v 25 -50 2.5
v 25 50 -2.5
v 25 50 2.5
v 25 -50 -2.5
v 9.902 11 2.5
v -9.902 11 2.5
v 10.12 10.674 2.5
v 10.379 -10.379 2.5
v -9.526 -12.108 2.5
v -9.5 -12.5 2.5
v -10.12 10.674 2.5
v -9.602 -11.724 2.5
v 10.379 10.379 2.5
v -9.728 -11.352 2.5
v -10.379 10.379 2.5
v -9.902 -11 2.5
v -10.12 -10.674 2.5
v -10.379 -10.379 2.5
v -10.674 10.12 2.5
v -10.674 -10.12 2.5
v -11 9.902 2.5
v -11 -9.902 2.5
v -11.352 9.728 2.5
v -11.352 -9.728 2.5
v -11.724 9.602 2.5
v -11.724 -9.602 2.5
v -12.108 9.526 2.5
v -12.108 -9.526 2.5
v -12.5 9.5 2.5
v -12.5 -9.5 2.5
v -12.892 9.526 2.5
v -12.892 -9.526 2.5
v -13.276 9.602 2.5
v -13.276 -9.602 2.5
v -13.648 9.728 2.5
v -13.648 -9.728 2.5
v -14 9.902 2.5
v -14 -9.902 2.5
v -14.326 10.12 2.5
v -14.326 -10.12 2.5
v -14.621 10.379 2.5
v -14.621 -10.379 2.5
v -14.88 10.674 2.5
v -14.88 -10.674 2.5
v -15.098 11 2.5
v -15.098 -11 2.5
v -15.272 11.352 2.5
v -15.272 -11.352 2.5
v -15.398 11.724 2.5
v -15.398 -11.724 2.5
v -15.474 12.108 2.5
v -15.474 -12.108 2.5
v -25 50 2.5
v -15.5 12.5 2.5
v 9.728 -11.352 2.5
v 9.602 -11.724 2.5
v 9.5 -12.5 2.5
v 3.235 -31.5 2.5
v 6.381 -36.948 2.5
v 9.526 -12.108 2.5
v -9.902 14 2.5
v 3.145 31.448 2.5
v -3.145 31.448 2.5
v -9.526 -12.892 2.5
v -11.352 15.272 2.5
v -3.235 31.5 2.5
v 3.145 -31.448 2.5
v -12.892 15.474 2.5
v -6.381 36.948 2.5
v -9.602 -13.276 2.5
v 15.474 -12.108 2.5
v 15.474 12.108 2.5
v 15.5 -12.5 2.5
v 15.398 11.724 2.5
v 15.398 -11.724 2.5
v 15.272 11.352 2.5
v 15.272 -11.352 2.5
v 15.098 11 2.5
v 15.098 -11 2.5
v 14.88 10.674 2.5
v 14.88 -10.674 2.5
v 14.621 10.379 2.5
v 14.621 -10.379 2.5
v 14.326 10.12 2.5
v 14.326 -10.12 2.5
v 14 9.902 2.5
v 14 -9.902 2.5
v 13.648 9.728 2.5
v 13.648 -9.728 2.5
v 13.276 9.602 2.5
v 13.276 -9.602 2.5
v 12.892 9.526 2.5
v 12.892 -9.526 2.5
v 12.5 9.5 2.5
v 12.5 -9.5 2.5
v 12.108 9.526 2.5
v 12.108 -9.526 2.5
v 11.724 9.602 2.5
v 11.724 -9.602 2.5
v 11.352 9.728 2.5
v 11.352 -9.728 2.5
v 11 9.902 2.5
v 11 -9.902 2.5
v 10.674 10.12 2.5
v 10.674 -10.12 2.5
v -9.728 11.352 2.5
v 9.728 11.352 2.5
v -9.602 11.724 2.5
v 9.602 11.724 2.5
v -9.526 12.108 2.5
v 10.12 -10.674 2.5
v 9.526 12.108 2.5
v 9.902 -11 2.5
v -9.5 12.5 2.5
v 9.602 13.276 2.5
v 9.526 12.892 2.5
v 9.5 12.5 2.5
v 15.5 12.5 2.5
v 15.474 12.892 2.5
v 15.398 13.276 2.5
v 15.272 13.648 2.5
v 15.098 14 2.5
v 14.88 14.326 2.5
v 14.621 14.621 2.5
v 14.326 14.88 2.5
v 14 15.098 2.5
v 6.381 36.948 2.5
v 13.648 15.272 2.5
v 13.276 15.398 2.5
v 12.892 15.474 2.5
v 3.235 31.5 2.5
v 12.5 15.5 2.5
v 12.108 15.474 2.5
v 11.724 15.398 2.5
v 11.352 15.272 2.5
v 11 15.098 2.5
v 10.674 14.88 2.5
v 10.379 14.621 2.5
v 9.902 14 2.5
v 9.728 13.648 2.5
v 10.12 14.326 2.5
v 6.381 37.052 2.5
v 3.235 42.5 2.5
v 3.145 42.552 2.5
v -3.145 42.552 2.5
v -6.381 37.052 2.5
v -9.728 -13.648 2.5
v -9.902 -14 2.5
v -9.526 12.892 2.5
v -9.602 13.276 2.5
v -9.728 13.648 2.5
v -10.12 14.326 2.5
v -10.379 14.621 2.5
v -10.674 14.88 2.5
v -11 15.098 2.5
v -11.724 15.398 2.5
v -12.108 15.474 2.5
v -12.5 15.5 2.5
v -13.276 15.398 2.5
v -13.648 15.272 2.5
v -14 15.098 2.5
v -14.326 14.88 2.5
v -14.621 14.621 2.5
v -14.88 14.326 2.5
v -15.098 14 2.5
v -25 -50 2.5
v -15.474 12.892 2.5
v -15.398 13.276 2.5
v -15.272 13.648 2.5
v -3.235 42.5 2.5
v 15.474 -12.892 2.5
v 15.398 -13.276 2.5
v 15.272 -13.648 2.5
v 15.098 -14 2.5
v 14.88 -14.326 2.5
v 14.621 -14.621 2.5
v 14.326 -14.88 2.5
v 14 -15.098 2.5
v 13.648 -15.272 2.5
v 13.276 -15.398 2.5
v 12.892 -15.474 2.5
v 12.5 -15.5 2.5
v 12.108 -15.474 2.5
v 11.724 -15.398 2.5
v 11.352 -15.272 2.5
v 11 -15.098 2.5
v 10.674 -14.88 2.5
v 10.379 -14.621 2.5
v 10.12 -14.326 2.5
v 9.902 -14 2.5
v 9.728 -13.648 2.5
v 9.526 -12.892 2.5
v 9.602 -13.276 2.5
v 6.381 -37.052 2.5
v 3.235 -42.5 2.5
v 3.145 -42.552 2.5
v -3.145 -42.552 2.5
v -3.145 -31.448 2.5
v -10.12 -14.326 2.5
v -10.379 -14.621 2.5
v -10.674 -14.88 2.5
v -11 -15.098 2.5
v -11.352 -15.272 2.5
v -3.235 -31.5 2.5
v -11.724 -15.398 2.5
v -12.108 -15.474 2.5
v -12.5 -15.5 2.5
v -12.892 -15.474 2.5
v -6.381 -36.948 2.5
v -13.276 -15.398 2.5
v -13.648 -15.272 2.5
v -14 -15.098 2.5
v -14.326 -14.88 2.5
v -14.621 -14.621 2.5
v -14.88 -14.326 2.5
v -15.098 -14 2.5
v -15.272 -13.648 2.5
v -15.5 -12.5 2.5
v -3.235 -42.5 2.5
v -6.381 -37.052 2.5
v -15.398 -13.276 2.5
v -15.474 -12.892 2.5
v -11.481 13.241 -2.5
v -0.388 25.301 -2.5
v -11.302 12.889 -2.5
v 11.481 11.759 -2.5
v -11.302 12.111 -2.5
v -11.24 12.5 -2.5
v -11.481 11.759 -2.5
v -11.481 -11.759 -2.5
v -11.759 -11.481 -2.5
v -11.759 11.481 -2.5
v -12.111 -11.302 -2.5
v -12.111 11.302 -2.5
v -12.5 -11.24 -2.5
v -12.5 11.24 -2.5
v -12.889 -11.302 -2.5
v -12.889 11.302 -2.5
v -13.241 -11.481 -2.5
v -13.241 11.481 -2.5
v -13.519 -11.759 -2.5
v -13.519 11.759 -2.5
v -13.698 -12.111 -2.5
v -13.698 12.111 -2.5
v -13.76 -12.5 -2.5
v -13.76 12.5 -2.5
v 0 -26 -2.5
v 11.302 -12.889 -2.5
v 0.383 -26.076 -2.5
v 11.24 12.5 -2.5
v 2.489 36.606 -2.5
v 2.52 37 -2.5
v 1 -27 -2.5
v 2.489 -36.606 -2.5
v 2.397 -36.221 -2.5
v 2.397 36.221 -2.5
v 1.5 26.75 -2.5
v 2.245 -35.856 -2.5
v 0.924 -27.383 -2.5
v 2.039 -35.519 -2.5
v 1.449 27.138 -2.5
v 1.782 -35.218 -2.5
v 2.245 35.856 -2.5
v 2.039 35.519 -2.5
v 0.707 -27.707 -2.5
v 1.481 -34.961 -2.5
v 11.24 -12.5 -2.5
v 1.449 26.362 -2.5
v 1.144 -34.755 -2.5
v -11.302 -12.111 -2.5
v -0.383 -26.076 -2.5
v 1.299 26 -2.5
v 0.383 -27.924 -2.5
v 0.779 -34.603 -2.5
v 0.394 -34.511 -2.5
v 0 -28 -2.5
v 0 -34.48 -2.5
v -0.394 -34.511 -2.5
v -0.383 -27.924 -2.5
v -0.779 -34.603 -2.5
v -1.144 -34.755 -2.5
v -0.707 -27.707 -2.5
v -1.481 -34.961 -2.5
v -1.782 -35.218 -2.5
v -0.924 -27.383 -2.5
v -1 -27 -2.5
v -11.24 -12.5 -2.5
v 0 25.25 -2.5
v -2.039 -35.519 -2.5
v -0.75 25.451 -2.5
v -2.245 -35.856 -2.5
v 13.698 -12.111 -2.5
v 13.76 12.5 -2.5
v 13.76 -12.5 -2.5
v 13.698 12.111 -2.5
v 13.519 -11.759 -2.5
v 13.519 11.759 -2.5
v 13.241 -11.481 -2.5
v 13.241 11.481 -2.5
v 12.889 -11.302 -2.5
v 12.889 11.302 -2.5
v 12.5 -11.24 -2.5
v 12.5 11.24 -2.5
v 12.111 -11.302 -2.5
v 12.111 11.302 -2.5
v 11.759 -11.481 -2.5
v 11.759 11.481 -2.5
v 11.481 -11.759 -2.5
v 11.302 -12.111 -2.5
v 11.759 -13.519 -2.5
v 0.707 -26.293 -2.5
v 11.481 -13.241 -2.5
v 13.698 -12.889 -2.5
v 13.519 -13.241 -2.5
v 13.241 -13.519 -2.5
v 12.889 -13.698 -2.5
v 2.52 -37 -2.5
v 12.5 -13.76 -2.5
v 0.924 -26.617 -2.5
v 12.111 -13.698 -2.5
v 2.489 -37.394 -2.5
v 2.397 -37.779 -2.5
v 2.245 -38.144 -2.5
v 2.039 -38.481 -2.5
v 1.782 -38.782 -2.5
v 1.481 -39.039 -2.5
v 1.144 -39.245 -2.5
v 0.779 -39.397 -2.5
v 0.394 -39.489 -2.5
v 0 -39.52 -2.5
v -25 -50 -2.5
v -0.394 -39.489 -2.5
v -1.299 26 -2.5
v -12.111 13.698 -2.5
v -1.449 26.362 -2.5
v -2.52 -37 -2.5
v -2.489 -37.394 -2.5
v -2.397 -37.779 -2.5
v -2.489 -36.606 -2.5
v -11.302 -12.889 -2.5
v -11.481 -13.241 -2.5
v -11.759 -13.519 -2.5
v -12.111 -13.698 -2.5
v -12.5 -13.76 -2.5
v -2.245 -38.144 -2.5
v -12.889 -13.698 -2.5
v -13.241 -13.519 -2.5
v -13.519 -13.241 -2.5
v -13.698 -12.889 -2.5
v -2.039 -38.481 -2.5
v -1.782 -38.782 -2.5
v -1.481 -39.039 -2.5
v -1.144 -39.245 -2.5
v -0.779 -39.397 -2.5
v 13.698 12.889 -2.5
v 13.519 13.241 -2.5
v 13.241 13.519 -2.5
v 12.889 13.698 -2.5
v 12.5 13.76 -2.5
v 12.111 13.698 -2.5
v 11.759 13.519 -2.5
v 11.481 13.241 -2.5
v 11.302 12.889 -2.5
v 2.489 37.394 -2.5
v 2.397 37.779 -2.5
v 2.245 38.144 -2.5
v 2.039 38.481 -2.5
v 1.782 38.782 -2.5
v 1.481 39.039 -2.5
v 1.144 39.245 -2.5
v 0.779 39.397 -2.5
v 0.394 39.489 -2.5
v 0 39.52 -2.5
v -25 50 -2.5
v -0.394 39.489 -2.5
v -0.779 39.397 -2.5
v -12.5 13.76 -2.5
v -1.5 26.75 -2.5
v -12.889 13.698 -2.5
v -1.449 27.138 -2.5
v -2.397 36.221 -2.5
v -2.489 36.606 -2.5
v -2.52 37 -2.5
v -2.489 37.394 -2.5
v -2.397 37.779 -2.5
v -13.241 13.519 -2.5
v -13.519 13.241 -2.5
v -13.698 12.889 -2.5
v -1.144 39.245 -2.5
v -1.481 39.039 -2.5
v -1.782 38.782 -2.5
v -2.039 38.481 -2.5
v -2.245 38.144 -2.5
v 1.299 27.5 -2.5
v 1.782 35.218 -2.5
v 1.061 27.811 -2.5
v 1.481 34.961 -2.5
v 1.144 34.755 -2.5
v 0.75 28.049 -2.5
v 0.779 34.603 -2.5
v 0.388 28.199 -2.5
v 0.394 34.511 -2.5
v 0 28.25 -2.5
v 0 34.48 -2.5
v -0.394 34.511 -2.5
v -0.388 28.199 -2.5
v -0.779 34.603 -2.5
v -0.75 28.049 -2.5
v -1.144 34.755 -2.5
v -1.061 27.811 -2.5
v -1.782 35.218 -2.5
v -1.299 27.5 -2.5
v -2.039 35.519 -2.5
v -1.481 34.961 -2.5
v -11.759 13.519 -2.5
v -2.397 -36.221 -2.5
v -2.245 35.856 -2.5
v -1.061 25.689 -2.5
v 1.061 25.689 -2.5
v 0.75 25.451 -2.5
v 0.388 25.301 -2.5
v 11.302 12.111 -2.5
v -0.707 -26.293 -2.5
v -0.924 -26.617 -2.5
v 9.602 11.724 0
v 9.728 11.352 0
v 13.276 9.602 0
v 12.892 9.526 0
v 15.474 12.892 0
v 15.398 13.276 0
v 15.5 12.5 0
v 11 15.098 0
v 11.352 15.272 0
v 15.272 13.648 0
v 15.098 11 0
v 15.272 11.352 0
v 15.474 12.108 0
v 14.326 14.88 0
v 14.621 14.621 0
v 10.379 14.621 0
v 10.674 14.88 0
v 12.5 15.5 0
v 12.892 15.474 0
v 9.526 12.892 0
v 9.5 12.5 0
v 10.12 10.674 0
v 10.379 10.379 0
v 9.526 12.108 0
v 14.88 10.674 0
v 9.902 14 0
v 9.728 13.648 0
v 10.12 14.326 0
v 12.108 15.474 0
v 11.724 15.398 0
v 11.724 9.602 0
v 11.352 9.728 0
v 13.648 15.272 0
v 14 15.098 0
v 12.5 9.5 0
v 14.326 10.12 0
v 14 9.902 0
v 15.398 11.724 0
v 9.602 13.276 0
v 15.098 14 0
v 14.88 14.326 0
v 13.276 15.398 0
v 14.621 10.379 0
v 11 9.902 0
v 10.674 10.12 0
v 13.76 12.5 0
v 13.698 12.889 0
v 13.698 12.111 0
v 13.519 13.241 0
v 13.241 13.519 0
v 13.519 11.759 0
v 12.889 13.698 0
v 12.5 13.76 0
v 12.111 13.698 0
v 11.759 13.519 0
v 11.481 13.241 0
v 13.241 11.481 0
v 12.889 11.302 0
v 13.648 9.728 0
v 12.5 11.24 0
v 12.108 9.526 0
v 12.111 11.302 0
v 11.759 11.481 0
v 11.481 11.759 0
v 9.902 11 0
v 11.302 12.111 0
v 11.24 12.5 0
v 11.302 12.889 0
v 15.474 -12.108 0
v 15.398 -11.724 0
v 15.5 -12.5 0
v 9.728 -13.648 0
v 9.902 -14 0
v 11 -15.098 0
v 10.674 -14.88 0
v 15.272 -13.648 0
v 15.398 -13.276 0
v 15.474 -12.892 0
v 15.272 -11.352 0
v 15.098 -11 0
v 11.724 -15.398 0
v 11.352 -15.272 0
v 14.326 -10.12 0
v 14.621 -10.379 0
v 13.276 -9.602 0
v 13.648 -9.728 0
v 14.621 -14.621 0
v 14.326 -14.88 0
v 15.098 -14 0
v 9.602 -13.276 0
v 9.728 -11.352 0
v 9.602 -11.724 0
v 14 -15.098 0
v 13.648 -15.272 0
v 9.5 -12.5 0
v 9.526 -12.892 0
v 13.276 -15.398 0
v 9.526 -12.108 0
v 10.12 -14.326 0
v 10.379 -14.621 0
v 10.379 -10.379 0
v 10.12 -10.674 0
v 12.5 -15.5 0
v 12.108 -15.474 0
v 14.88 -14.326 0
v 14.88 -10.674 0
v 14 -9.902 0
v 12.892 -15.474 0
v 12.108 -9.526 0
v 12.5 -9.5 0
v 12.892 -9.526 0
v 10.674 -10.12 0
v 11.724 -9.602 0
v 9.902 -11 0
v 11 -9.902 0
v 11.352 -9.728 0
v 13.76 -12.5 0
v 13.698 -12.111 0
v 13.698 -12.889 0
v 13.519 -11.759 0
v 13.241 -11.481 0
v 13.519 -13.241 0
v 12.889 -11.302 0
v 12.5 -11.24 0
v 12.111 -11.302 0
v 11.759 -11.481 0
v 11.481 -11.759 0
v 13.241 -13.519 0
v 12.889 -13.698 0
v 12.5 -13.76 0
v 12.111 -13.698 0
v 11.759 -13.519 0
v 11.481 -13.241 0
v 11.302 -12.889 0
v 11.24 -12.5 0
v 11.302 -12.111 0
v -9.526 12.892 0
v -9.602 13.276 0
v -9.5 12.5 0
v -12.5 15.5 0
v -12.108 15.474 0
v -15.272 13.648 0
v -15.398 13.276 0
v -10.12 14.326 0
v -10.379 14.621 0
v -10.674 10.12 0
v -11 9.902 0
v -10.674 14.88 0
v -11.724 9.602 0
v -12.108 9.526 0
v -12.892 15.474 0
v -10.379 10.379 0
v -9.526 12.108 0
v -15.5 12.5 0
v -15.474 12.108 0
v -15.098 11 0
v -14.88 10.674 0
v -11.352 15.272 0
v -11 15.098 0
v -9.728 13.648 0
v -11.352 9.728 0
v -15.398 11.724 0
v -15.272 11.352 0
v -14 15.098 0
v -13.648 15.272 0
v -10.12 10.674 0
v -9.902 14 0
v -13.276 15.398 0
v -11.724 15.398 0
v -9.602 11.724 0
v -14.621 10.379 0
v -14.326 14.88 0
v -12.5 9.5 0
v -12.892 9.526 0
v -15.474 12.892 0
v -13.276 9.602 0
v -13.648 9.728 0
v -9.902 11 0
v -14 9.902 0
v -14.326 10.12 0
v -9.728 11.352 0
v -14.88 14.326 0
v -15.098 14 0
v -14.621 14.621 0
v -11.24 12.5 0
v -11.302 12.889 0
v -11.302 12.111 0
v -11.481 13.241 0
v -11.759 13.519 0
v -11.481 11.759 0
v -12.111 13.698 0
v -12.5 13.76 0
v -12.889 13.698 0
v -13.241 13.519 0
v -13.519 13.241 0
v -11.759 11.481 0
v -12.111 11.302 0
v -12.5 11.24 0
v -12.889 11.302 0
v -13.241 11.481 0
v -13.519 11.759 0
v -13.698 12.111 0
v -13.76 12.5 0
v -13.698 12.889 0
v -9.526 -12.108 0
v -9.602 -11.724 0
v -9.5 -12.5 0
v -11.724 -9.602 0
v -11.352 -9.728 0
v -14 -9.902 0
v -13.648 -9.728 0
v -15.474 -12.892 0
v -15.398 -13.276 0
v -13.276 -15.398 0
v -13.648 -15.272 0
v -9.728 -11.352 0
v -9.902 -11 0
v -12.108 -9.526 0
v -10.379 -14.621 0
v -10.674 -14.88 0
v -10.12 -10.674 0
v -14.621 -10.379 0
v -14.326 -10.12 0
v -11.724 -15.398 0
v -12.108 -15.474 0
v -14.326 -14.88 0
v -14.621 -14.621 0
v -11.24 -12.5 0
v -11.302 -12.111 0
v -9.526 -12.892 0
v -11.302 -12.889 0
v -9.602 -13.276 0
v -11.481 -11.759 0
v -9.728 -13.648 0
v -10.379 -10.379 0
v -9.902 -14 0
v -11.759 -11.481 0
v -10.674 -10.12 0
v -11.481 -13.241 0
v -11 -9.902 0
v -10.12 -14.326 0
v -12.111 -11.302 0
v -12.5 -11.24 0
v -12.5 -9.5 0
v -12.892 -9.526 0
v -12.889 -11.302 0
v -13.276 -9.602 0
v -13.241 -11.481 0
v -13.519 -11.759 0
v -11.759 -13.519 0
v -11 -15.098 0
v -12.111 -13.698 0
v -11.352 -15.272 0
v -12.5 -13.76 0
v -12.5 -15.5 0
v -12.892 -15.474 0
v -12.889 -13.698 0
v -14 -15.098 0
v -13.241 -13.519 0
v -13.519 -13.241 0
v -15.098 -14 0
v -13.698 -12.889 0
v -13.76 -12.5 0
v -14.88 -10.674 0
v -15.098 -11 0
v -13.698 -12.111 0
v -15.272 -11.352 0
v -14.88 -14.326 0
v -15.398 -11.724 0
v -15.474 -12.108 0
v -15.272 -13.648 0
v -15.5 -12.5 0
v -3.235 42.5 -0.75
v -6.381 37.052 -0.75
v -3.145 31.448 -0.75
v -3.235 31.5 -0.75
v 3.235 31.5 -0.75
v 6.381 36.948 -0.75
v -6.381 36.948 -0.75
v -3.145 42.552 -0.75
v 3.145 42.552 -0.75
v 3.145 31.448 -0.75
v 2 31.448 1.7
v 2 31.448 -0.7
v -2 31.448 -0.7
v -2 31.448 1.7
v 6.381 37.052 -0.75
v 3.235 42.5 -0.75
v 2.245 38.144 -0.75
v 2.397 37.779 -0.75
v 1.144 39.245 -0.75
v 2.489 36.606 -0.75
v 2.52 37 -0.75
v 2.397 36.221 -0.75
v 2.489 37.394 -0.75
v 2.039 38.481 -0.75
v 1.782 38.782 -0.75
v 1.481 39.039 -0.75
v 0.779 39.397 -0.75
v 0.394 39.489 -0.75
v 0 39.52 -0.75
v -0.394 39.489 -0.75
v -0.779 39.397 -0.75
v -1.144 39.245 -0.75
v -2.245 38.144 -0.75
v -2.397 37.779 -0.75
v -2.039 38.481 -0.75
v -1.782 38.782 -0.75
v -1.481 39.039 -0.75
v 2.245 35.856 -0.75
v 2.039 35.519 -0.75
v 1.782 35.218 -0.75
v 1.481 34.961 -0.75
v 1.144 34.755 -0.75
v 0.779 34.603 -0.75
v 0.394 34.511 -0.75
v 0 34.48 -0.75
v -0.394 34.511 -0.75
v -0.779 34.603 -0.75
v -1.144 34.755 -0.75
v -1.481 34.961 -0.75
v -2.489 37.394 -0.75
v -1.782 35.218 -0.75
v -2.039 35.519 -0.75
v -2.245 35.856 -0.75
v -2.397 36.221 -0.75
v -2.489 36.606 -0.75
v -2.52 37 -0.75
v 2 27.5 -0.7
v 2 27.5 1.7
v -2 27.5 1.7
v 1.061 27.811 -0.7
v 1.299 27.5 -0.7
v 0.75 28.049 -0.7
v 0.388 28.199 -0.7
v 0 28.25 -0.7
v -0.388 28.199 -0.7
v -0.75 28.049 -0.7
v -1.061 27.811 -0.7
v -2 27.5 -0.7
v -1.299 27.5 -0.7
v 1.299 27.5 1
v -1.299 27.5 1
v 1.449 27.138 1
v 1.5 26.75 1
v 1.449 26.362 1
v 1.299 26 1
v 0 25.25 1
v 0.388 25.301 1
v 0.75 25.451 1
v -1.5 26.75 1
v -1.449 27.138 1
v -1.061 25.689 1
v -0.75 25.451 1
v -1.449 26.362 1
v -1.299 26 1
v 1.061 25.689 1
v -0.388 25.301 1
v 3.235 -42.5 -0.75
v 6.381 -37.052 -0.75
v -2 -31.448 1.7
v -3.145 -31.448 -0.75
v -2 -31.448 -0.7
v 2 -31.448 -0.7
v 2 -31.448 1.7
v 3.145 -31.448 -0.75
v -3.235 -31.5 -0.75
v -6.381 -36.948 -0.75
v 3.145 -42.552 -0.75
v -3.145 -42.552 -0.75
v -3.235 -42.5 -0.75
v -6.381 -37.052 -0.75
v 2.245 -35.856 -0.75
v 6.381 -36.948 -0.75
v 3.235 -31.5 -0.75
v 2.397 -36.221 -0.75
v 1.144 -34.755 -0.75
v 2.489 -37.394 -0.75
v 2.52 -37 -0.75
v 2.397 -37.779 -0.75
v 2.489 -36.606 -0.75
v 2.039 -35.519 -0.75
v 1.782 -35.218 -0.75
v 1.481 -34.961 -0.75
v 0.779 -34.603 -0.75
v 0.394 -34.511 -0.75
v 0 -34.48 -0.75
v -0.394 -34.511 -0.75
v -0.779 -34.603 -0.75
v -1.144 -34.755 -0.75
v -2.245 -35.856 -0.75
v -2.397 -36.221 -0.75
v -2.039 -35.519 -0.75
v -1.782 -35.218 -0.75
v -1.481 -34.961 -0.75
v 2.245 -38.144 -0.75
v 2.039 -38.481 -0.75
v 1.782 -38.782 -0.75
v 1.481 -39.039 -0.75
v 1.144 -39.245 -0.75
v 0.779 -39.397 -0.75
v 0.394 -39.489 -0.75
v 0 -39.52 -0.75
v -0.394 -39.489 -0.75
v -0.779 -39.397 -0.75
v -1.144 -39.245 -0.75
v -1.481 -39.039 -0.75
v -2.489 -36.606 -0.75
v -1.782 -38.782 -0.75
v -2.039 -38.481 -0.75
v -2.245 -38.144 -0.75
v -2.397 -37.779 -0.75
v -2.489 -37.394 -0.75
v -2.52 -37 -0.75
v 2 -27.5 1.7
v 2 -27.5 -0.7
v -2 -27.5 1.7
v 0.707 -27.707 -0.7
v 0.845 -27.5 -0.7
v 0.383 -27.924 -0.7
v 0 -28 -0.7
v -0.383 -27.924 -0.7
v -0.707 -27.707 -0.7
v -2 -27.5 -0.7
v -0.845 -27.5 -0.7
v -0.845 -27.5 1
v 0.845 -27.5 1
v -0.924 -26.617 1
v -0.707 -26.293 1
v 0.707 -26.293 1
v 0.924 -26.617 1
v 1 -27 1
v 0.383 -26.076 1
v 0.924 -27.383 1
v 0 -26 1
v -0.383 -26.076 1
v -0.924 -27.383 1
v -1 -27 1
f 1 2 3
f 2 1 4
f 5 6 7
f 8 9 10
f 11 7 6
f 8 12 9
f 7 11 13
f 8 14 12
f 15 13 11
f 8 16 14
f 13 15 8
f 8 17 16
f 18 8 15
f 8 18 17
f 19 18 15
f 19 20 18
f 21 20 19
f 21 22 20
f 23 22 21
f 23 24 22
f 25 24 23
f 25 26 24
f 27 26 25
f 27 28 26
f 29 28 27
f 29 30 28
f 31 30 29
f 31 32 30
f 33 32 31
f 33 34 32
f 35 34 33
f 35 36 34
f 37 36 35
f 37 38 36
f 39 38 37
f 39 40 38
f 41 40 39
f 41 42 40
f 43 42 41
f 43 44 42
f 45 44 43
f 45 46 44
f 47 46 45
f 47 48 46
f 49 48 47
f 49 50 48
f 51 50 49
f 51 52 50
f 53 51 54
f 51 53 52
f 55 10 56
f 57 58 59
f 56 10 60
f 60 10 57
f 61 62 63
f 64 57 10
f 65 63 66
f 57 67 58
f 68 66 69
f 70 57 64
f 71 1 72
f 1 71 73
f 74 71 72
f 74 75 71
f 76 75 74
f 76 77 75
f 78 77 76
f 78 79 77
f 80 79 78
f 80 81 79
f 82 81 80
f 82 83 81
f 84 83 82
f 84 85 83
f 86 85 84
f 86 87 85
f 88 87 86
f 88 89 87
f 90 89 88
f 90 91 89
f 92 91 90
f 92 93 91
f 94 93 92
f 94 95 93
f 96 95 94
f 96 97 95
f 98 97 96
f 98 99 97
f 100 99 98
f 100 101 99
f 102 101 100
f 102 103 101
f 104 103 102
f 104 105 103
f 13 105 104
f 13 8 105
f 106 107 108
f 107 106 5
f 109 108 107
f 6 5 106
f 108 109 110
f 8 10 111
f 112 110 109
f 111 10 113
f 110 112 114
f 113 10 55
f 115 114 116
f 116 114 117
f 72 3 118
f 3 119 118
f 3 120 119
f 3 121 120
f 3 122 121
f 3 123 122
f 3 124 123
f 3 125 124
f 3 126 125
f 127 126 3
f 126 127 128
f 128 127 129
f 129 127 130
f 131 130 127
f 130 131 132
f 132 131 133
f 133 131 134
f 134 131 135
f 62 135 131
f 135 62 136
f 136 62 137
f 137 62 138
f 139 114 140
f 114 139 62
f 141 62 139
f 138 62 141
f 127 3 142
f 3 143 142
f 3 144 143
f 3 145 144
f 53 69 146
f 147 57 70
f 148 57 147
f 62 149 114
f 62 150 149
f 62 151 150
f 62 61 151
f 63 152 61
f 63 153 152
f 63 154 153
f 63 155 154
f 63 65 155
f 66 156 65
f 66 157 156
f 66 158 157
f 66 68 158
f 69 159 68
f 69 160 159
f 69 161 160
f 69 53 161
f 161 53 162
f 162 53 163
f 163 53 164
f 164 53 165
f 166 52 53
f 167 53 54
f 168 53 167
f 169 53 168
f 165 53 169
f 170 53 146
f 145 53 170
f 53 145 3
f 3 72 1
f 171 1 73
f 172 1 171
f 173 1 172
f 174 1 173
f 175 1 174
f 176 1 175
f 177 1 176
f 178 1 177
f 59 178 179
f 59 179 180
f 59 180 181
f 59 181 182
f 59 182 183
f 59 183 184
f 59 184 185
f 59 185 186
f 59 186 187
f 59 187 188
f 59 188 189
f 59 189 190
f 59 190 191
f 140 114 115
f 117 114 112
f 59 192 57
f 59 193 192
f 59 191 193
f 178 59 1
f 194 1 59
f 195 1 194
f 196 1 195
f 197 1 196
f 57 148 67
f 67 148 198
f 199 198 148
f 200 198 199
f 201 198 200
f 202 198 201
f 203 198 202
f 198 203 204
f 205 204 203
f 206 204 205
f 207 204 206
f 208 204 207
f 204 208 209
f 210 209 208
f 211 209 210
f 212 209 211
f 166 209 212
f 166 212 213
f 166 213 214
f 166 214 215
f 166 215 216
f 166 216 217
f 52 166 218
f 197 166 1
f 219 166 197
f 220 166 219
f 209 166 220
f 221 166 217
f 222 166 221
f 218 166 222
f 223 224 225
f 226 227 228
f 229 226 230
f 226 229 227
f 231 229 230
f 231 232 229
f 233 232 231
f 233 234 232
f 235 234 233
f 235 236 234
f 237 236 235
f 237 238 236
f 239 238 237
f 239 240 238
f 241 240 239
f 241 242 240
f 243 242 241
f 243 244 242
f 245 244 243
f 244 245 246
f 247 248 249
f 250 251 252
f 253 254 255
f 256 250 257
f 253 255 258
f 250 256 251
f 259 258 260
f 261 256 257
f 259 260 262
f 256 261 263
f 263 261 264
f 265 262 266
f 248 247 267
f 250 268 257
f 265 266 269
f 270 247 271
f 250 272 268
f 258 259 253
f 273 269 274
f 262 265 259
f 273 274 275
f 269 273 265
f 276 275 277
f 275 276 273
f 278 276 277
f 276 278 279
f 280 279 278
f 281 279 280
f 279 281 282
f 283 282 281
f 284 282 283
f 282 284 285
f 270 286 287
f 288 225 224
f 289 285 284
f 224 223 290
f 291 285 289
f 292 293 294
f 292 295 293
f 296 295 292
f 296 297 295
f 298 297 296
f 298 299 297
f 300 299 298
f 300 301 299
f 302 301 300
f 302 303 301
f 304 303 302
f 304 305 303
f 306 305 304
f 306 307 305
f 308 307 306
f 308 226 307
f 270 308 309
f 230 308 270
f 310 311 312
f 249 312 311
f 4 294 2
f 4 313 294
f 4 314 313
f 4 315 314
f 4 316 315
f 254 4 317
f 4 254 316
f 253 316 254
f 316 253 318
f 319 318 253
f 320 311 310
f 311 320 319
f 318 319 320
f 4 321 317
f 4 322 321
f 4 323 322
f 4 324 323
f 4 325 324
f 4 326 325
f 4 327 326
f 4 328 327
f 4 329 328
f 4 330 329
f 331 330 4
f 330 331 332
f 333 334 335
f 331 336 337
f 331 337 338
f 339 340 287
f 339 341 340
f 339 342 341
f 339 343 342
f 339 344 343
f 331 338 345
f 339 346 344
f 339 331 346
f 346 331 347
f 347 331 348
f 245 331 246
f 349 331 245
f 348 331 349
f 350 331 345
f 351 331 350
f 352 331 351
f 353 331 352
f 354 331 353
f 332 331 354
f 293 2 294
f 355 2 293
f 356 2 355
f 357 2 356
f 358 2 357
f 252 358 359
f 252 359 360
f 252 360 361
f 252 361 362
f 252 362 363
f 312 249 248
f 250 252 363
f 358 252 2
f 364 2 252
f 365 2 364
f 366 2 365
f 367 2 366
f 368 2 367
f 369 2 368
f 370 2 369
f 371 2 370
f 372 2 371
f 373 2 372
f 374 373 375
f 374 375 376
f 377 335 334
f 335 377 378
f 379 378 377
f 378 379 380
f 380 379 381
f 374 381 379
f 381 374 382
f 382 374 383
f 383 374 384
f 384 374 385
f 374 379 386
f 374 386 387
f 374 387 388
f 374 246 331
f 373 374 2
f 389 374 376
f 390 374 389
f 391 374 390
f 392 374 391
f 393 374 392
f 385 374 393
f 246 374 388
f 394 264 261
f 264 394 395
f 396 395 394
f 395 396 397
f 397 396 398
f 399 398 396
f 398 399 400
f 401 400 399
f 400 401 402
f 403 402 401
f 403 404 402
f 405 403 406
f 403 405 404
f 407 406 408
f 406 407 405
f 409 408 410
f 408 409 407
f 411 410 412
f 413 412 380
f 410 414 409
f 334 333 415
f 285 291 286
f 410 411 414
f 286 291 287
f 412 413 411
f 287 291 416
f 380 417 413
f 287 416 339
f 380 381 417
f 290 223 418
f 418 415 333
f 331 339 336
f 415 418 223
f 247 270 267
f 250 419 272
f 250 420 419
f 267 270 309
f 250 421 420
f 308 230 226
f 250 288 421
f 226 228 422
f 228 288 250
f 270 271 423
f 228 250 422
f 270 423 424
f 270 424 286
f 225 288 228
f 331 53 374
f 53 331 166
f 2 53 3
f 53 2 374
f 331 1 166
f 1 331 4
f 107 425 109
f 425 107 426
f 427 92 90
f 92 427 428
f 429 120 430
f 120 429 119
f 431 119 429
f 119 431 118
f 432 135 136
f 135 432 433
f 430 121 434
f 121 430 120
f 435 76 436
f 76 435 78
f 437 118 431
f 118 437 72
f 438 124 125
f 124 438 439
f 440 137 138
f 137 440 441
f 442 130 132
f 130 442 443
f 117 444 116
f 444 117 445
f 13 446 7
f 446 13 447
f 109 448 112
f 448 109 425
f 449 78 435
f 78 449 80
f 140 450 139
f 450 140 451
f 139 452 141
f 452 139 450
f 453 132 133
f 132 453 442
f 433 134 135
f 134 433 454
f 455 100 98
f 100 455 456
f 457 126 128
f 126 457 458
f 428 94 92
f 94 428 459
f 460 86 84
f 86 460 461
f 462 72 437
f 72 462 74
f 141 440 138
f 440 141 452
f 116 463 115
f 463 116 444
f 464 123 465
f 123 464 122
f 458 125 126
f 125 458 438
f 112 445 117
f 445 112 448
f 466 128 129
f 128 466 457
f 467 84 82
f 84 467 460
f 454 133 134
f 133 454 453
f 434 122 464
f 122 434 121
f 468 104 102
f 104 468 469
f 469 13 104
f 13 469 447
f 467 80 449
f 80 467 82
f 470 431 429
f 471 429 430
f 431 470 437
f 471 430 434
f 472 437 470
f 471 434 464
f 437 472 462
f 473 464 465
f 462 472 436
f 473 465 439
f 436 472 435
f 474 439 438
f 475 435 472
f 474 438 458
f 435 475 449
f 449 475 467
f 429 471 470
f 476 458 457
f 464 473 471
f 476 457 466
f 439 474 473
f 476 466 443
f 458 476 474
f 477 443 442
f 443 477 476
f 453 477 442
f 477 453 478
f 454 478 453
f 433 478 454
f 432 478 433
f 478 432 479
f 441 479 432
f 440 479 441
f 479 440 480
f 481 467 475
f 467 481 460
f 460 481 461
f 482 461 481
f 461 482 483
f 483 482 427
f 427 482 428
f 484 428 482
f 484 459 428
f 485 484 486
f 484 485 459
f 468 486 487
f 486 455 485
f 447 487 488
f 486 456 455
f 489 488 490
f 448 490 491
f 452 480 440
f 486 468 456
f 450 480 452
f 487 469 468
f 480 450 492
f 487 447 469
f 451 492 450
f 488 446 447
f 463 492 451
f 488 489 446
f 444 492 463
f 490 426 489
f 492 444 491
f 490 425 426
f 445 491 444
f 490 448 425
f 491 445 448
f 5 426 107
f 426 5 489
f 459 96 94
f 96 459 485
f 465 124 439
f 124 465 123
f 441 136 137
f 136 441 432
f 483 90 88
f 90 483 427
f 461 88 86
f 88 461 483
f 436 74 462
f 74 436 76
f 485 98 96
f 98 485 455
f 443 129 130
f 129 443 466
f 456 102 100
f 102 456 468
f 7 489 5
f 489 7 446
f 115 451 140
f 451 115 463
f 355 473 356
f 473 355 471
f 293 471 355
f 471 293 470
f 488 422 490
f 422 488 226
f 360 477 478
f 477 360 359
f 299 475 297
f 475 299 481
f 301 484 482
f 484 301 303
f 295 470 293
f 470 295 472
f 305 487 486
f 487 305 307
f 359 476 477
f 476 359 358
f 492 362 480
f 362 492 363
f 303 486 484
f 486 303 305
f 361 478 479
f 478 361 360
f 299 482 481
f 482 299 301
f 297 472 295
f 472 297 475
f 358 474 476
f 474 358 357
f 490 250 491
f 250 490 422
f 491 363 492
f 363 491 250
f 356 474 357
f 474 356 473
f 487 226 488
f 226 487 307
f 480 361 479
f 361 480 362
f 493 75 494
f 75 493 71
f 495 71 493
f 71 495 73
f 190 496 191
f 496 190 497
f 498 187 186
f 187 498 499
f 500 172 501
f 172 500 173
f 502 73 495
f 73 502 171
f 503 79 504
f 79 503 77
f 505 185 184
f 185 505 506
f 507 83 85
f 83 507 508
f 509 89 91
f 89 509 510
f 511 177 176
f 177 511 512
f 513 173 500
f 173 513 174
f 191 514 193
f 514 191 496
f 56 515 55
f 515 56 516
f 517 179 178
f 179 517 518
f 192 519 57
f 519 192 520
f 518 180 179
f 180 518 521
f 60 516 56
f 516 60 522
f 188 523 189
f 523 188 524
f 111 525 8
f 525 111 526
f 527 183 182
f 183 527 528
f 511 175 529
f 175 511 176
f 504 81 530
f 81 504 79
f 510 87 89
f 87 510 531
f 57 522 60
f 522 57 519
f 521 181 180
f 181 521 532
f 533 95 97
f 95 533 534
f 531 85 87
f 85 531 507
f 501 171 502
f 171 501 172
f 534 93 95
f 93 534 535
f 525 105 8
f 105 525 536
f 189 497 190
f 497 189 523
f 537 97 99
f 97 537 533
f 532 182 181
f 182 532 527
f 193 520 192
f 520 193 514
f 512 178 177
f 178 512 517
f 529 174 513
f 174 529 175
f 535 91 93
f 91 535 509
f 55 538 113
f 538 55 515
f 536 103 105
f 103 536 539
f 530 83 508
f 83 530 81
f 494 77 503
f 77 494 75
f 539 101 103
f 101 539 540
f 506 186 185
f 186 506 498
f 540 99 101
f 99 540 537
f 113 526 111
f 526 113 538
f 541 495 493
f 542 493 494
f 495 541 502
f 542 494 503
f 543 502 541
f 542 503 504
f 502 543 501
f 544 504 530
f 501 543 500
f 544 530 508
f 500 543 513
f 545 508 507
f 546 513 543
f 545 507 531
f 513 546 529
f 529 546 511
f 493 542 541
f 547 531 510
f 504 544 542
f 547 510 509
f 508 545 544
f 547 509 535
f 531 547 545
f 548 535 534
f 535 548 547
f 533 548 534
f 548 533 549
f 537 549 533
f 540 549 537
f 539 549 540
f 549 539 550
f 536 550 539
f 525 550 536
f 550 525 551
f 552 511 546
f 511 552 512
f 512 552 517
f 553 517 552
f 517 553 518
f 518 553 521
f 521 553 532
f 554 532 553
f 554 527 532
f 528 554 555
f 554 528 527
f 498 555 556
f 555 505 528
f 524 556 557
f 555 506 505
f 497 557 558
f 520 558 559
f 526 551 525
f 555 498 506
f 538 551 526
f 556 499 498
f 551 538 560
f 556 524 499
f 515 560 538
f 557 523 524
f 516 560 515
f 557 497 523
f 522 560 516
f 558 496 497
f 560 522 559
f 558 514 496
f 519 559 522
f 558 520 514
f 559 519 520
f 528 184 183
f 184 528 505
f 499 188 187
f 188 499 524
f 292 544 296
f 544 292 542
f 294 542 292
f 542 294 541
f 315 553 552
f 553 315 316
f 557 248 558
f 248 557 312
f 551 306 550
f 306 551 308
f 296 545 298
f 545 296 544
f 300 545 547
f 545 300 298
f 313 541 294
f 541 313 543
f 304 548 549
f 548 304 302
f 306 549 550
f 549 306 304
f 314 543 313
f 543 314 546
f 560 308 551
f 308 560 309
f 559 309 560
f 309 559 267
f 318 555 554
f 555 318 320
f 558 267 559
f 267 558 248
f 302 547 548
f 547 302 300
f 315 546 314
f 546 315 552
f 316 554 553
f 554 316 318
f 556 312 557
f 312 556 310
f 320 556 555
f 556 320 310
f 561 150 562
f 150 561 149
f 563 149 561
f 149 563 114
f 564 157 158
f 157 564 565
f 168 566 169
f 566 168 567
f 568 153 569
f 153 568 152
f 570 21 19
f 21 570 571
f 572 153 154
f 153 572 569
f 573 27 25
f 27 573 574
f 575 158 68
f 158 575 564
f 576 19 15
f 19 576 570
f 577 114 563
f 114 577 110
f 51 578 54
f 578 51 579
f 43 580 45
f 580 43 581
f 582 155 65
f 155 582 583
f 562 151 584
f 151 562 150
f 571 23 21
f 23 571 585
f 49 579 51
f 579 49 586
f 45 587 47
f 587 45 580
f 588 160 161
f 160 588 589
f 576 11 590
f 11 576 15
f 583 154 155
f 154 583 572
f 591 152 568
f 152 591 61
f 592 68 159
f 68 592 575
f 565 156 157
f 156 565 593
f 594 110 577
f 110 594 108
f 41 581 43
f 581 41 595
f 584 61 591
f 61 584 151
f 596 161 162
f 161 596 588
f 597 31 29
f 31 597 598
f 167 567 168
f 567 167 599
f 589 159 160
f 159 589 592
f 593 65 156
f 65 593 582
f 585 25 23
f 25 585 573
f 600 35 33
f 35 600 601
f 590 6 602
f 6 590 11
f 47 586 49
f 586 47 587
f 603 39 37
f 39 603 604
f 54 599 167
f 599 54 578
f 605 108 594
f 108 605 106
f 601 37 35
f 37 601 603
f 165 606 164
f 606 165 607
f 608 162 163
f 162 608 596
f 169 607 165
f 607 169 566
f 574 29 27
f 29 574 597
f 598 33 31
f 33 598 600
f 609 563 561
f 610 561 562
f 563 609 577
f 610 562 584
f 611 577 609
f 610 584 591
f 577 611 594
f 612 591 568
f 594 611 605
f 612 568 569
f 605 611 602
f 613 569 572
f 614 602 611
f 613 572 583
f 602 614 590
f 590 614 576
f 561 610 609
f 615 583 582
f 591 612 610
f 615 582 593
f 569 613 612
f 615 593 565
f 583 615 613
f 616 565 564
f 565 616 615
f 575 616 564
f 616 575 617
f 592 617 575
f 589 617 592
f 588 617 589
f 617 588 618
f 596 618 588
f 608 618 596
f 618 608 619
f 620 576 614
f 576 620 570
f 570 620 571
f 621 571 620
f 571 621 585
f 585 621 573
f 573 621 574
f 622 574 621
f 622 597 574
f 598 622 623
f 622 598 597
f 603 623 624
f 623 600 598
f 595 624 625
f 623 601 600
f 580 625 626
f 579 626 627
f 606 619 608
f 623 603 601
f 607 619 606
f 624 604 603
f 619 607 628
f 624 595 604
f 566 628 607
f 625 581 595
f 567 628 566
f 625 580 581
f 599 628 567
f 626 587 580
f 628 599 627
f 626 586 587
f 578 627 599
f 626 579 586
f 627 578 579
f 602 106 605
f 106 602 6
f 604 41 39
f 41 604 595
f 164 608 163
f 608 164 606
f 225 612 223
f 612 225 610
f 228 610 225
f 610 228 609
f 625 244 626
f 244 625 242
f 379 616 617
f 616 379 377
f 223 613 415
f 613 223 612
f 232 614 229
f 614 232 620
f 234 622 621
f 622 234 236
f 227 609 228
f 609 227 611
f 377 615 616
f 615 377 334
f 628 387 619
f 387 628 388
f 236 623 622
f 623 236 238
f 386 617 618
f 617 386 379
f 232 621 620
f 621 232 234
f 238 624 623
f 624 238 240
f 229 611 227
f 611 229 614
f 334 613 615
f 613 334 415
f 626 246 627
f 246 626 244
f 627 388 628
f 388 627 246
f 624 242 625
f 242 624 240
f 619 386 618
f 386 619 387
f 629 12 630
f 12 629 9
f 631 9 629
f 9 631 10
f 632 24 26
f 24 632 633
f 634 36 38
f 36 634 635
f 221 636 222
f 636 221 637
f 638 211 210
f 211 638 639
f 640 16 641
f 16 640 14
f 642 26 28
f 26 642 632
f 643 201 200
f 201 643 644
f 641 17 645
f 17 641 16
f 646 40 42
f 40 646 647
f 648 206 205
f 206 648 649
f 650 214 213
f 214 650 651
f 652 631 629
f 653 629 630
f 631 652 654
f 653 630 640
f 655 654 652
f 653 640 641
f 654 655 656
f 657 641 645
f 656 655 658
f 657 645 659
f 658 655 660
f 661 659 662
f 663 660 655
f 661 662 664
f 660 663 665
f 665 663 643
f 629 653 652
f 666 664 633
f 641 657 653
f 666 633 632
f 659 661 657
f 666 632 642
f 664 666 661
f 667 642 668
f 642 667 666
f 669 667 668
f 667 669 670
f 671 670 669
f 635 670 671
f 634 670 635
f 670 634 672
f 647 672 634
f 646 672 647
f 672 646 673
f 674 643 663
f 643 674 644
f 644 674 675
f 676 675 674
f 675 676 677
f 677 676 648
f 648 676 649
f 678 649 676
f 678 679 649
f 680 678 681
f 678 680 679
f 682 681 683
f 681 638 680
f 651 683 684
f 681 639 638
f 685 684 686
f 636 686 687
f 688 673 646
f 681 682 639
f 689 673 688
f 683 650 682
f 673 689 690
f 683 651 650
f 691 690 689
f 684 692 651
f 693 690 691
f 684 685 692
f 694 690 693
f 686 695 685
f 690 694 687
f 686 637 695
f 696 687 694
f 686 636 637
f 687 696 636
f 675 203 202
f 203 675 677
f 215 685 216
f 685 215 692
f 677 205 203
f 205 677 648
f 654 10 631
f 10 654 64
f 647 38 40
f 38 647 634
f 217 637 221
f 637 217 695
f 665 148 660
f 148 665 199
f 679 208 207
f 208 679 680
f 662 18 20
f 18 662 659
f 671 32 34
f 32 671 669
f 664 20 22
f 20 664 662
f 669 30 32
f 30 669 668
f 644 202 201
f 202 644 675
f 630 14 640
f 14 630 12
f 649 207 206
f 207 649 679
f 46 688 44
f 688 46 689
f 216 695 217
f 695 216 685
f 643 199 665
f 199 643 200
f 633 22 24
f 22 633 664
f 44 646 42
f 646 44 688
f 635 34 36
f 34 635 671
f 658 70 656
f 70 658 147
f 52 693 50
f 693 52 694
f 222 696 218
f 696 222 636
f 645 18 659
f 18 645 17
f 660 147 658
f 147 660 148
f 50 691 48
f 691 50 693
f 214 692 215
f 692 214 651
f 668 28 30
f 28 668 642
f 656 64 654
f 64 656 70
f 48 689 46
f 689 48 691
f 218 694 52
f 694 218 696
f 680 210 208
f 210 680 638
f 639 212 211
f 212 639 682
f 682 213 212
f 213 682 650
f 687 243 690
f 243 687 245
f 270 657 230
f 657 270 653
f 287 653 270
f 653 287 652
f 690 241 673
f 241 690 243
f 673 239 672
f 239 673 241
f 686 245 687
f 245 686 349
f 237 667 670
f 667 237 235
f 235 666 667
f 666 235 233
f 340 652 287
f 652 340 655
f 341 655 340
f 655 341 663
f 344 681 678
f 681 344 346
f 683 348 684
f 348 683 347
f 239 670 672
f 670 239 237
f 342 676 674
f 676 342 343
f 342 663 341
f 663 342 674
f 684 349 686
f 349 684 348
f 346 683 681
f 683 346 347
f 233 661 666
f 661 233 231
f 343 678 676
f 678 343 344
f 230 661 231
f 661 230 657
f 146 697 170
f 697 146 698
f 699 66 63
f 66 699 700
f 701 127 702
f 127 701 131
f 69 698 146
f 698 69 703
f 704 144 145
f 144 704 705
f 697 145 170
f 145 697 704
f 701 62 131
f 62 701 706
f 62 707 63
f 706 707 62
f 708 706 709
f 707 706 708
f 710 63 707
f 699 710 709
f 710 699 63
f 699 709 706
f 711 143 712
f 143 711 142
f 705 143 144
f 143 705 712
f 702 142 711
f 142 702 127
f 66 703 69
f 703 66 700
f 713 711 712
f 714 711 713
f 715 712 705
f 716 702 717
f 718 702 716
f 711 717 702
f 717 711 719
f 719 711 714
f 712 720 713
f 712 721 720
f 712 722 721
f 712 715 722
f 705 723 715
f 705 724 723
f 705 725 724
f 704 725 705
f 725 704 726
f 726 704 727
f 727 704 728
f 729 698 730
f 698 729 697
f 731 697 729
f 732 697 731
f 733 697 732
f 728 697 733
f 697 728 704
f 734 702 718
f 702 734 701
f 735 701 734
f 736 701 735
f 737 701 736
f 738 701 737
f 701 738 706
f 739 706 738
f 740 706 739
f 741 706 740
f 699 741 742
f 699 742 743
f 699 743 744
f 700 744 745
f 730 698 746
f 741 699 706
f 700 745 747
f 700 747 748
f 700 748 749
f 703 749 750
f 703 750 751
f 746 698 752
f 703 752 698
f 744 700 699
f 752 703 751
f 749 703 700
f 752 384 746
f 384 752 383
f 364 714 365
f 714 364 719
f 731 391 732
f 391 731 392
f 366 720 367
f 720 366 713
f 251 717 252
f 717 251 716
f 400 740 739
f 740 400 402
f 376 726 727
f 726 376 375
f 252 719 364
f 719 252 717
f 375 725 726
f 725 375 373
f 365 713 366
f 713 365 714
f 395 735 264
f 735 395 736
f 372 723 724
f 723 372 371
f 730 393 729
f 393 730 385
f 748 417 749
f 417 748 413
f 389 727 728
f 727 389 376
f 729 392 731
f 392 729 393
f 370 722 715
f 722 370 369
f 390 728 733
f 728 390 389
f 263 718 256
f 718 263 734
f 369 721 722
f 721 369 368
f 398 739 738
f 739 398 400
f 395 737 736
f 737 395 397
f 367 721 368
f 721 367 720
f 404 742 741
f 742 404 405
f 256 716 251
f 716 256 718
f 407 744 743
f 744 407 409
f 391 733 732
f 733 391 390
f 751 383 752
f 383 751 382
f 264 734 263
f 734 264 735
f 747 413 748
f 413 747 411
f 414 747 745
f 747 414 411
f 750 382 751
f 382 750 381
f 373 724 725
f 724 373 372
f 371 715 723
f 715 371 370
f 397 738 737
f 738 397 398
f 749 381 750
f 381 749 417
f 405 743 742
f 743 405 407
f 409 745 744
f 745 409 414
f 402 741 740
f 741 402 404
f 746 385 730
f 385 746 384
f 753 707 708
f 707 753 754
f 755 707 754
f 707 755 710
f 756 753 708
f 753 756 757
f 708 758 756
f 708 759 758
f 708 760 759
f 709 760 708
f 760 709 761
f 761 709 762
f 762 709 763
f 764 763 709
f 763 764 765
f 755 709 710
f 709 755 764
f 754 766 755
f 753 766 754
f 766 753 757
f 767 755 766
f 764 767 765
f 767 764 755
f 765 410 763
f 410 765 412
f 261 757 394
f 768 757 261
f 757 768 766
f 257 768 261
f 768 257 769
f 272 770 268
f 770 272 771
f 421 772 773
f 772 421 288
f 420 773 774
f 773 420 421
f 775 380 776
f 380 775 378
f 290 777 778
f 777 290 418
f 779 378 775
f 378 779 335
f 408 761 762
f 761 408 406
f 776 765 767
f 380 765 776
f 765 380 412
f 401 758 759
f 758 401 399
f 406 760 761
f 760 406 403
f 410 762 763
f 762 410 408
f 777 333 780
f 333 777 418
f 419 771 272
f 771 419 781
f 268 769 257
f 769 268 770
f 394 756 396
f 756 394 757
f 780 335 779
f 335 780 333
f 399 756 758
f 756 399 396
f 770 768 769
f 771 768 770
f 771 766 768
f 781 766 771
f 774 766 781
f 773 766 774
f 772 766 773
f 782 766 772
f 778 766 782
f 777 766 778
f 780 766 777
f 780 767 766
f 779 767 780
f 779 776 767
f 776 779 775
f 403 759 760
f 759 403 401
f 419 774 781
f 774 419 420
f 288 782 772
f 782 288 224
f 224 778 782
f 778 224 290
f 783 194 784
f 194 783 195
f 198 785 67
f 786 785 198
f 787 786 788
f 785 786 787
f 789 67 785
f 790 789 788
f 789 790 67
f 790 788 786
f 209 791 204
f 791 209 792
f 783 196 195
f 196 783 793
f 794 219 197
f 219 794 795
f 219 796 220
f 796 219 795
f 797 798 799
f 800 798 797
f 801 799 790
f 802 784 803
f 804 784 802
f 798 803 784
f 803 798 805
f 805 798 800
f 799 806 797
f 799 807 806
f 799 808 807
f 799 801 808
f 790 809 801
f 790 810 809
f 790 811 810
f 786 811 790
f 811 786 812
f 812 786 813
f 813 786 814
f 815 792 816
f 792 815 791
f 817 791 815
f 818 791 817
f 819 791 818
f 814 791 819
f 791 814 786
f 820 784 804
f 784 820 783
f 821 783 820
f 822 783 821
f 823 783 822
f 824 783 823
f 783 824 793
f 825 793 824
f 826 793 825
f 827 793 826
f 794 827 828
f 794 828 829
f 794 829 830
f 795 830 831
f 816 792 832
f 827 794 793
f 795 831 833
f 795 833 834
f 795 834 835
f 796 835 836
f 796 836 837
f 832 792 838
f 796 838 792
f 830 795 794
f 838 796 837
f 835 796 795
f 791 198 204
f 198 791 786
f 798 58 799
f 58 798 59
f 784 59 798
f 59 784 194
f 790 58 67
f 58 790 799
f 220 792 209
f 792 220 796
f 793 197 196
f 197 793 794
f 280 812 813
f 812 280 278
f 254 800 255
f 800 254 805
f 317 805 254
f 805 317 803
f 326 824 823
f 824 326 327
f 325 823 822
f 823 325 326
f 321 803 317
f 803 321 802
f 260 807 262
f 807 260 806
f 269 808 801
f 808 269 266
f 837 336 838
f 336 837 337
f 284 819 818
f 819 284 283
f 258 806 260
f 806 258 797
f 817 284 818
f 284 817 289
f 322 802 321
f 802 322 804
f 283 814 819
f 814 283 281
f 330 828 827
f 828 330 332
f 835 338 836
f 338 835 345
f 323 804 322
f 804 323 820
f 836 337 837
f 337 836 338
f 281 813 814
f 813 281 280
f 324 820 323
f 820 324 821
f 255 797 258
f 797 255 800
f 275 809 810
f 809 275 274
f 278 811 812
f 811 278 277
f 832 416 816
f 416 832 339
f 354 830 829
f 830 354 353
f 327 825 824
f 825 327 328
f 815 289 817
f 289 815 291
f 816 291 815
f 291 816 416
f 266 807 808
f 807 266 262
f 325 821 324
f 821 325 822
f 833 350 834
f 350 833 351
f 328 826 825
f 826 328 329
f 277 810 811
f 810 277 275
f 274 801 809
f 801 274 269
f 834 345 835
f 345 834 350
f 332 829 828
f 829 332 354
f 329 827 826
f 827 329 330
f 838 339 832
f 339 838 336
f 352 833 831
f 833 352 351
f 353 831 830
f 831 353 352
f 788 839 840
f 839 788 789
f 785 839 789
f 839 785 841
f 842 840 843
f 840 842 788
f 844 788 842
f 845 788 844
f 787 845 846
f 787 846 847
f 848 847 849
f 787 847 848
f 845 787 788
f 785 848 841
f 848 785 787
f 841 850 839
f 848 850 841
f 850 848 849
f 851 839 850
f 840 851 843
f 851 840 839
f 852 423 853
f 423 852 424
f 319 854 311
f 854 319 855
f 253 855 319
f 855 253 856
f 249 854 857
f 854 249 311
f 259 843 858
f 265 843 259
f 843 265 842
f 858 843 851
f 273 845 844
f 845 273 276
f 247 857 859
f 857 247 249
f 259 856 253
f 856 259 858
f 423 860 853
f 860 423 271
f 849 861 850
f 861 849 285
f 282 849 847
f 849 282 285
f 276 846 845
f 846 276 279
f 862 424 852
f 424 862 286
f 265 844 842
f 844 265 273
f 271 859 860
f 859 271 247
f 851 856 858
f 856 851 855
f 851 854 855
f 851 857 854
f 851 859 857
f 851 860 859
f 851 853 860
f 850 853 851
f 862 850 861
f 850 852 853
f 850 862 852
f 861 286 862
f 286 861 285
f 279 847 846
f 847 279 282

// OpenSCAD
$fa = 1;
$fs = 0.4;

module phex(wid,rad,height){
hull(){
translate([wid/2-rad,0,0])cylinder(r=rad,h=height);
rotate([0,0,60])translate([wid/2-rad,0,0])cylinder(r=rad,h=height);
rotate([0,0,120])translate([wid/2-rad,0,0])cylinder(r=rad,h=height);
rotate([0,0,180])translate([wid/2-rad,0,0])cylinder(r=rad,h=height);
rotate([0,0,240])translate([wid/2-rad,0,0])cylinder(r=rad,h=height);
rotate([0,0,300])translate([wid/2-rad,0,0])cylinder(r=rad,h=height);

}
}

module fhex(wid,height){
hull(){
cube([wid/1.7,wid,height],center = true);
rotate([0,0,120])cube([wid/1.7,wid,height],center = true);
rotate([0,0,240])cube([wid/1.7,wid,height],center = true);
}
}




difference(){
cube([50
,100,5],center=true);

translate([12.5,12.5,(2.24+0.5)/2])
cylinder(h=2.24+0.5+0.001,r=6/2,center=true);

translate([12.5,12.5,0])
cylinder(h=5.5+0.001,r=2.52/2,center=true);

translate([12.5,-12.5,(2.24+0.5)/2])
cylinder(h=2.24+0.5+0.001,r=6/2,center=true);
translate([12.5,-12.5,0])
cylinder(h=5+0.5+0.001,r=2.52/2,center=true);

translate([-12.5,12.5,(2.24+0.5)/2])
cylinder(h=2.24+0.5+0.001,r=6/2,center=true);
translate([-12.5,12.5,0])
cylinder(h=5+0.5+0.001,r=2.52/2,center=true);
    
translate([-12.5,-12.5,(2.24+0.5)/2])
cylinder(h=2.24+0.5+0.001,r=6/2,center=true);
translate([-12.5,-12.5,0])
cylinder(h=5+0.001,r=2.52/2,center=true);

//hexagono superior 
translate([0,37,1.2])
fhex(11,4-0.1);

//hueco para bulon concentrico a hexagono
translate([0,37,1.5])
cylinder(h=8+0.001,r=5.04/2,center=true);

//hueco rectangular 37mm-5(ancho de hexagono)-largo/2 de hueco
translate([0,32-4/2,1/2])
color([1,0,1])cube([4
,5,2.4],center=true);


// Cilindro al final del hueco 32-Ltotal-radio/2
translate([0,32-4.5-1.5/2,-1])
cylinder(h=4+0.001,r=1.5,center=true);

//hexagono inferior

translate([0,-37,1.2])
fhex(11,4-0.1);

translate([0,-37,1.5])
cylinder(h=8+0.001,r=5.04/2,center=true); 

translate([0,-32+4/2,1/2])
color([1,0,0])cube([4
,5,2.4],center=true);

translate([0,-32+4.5+1/2,-1])
cylinder(h=4+0.001,r=1,center=true);

}

//color([100,0,1])cube([300,300,4-1], center=true);
